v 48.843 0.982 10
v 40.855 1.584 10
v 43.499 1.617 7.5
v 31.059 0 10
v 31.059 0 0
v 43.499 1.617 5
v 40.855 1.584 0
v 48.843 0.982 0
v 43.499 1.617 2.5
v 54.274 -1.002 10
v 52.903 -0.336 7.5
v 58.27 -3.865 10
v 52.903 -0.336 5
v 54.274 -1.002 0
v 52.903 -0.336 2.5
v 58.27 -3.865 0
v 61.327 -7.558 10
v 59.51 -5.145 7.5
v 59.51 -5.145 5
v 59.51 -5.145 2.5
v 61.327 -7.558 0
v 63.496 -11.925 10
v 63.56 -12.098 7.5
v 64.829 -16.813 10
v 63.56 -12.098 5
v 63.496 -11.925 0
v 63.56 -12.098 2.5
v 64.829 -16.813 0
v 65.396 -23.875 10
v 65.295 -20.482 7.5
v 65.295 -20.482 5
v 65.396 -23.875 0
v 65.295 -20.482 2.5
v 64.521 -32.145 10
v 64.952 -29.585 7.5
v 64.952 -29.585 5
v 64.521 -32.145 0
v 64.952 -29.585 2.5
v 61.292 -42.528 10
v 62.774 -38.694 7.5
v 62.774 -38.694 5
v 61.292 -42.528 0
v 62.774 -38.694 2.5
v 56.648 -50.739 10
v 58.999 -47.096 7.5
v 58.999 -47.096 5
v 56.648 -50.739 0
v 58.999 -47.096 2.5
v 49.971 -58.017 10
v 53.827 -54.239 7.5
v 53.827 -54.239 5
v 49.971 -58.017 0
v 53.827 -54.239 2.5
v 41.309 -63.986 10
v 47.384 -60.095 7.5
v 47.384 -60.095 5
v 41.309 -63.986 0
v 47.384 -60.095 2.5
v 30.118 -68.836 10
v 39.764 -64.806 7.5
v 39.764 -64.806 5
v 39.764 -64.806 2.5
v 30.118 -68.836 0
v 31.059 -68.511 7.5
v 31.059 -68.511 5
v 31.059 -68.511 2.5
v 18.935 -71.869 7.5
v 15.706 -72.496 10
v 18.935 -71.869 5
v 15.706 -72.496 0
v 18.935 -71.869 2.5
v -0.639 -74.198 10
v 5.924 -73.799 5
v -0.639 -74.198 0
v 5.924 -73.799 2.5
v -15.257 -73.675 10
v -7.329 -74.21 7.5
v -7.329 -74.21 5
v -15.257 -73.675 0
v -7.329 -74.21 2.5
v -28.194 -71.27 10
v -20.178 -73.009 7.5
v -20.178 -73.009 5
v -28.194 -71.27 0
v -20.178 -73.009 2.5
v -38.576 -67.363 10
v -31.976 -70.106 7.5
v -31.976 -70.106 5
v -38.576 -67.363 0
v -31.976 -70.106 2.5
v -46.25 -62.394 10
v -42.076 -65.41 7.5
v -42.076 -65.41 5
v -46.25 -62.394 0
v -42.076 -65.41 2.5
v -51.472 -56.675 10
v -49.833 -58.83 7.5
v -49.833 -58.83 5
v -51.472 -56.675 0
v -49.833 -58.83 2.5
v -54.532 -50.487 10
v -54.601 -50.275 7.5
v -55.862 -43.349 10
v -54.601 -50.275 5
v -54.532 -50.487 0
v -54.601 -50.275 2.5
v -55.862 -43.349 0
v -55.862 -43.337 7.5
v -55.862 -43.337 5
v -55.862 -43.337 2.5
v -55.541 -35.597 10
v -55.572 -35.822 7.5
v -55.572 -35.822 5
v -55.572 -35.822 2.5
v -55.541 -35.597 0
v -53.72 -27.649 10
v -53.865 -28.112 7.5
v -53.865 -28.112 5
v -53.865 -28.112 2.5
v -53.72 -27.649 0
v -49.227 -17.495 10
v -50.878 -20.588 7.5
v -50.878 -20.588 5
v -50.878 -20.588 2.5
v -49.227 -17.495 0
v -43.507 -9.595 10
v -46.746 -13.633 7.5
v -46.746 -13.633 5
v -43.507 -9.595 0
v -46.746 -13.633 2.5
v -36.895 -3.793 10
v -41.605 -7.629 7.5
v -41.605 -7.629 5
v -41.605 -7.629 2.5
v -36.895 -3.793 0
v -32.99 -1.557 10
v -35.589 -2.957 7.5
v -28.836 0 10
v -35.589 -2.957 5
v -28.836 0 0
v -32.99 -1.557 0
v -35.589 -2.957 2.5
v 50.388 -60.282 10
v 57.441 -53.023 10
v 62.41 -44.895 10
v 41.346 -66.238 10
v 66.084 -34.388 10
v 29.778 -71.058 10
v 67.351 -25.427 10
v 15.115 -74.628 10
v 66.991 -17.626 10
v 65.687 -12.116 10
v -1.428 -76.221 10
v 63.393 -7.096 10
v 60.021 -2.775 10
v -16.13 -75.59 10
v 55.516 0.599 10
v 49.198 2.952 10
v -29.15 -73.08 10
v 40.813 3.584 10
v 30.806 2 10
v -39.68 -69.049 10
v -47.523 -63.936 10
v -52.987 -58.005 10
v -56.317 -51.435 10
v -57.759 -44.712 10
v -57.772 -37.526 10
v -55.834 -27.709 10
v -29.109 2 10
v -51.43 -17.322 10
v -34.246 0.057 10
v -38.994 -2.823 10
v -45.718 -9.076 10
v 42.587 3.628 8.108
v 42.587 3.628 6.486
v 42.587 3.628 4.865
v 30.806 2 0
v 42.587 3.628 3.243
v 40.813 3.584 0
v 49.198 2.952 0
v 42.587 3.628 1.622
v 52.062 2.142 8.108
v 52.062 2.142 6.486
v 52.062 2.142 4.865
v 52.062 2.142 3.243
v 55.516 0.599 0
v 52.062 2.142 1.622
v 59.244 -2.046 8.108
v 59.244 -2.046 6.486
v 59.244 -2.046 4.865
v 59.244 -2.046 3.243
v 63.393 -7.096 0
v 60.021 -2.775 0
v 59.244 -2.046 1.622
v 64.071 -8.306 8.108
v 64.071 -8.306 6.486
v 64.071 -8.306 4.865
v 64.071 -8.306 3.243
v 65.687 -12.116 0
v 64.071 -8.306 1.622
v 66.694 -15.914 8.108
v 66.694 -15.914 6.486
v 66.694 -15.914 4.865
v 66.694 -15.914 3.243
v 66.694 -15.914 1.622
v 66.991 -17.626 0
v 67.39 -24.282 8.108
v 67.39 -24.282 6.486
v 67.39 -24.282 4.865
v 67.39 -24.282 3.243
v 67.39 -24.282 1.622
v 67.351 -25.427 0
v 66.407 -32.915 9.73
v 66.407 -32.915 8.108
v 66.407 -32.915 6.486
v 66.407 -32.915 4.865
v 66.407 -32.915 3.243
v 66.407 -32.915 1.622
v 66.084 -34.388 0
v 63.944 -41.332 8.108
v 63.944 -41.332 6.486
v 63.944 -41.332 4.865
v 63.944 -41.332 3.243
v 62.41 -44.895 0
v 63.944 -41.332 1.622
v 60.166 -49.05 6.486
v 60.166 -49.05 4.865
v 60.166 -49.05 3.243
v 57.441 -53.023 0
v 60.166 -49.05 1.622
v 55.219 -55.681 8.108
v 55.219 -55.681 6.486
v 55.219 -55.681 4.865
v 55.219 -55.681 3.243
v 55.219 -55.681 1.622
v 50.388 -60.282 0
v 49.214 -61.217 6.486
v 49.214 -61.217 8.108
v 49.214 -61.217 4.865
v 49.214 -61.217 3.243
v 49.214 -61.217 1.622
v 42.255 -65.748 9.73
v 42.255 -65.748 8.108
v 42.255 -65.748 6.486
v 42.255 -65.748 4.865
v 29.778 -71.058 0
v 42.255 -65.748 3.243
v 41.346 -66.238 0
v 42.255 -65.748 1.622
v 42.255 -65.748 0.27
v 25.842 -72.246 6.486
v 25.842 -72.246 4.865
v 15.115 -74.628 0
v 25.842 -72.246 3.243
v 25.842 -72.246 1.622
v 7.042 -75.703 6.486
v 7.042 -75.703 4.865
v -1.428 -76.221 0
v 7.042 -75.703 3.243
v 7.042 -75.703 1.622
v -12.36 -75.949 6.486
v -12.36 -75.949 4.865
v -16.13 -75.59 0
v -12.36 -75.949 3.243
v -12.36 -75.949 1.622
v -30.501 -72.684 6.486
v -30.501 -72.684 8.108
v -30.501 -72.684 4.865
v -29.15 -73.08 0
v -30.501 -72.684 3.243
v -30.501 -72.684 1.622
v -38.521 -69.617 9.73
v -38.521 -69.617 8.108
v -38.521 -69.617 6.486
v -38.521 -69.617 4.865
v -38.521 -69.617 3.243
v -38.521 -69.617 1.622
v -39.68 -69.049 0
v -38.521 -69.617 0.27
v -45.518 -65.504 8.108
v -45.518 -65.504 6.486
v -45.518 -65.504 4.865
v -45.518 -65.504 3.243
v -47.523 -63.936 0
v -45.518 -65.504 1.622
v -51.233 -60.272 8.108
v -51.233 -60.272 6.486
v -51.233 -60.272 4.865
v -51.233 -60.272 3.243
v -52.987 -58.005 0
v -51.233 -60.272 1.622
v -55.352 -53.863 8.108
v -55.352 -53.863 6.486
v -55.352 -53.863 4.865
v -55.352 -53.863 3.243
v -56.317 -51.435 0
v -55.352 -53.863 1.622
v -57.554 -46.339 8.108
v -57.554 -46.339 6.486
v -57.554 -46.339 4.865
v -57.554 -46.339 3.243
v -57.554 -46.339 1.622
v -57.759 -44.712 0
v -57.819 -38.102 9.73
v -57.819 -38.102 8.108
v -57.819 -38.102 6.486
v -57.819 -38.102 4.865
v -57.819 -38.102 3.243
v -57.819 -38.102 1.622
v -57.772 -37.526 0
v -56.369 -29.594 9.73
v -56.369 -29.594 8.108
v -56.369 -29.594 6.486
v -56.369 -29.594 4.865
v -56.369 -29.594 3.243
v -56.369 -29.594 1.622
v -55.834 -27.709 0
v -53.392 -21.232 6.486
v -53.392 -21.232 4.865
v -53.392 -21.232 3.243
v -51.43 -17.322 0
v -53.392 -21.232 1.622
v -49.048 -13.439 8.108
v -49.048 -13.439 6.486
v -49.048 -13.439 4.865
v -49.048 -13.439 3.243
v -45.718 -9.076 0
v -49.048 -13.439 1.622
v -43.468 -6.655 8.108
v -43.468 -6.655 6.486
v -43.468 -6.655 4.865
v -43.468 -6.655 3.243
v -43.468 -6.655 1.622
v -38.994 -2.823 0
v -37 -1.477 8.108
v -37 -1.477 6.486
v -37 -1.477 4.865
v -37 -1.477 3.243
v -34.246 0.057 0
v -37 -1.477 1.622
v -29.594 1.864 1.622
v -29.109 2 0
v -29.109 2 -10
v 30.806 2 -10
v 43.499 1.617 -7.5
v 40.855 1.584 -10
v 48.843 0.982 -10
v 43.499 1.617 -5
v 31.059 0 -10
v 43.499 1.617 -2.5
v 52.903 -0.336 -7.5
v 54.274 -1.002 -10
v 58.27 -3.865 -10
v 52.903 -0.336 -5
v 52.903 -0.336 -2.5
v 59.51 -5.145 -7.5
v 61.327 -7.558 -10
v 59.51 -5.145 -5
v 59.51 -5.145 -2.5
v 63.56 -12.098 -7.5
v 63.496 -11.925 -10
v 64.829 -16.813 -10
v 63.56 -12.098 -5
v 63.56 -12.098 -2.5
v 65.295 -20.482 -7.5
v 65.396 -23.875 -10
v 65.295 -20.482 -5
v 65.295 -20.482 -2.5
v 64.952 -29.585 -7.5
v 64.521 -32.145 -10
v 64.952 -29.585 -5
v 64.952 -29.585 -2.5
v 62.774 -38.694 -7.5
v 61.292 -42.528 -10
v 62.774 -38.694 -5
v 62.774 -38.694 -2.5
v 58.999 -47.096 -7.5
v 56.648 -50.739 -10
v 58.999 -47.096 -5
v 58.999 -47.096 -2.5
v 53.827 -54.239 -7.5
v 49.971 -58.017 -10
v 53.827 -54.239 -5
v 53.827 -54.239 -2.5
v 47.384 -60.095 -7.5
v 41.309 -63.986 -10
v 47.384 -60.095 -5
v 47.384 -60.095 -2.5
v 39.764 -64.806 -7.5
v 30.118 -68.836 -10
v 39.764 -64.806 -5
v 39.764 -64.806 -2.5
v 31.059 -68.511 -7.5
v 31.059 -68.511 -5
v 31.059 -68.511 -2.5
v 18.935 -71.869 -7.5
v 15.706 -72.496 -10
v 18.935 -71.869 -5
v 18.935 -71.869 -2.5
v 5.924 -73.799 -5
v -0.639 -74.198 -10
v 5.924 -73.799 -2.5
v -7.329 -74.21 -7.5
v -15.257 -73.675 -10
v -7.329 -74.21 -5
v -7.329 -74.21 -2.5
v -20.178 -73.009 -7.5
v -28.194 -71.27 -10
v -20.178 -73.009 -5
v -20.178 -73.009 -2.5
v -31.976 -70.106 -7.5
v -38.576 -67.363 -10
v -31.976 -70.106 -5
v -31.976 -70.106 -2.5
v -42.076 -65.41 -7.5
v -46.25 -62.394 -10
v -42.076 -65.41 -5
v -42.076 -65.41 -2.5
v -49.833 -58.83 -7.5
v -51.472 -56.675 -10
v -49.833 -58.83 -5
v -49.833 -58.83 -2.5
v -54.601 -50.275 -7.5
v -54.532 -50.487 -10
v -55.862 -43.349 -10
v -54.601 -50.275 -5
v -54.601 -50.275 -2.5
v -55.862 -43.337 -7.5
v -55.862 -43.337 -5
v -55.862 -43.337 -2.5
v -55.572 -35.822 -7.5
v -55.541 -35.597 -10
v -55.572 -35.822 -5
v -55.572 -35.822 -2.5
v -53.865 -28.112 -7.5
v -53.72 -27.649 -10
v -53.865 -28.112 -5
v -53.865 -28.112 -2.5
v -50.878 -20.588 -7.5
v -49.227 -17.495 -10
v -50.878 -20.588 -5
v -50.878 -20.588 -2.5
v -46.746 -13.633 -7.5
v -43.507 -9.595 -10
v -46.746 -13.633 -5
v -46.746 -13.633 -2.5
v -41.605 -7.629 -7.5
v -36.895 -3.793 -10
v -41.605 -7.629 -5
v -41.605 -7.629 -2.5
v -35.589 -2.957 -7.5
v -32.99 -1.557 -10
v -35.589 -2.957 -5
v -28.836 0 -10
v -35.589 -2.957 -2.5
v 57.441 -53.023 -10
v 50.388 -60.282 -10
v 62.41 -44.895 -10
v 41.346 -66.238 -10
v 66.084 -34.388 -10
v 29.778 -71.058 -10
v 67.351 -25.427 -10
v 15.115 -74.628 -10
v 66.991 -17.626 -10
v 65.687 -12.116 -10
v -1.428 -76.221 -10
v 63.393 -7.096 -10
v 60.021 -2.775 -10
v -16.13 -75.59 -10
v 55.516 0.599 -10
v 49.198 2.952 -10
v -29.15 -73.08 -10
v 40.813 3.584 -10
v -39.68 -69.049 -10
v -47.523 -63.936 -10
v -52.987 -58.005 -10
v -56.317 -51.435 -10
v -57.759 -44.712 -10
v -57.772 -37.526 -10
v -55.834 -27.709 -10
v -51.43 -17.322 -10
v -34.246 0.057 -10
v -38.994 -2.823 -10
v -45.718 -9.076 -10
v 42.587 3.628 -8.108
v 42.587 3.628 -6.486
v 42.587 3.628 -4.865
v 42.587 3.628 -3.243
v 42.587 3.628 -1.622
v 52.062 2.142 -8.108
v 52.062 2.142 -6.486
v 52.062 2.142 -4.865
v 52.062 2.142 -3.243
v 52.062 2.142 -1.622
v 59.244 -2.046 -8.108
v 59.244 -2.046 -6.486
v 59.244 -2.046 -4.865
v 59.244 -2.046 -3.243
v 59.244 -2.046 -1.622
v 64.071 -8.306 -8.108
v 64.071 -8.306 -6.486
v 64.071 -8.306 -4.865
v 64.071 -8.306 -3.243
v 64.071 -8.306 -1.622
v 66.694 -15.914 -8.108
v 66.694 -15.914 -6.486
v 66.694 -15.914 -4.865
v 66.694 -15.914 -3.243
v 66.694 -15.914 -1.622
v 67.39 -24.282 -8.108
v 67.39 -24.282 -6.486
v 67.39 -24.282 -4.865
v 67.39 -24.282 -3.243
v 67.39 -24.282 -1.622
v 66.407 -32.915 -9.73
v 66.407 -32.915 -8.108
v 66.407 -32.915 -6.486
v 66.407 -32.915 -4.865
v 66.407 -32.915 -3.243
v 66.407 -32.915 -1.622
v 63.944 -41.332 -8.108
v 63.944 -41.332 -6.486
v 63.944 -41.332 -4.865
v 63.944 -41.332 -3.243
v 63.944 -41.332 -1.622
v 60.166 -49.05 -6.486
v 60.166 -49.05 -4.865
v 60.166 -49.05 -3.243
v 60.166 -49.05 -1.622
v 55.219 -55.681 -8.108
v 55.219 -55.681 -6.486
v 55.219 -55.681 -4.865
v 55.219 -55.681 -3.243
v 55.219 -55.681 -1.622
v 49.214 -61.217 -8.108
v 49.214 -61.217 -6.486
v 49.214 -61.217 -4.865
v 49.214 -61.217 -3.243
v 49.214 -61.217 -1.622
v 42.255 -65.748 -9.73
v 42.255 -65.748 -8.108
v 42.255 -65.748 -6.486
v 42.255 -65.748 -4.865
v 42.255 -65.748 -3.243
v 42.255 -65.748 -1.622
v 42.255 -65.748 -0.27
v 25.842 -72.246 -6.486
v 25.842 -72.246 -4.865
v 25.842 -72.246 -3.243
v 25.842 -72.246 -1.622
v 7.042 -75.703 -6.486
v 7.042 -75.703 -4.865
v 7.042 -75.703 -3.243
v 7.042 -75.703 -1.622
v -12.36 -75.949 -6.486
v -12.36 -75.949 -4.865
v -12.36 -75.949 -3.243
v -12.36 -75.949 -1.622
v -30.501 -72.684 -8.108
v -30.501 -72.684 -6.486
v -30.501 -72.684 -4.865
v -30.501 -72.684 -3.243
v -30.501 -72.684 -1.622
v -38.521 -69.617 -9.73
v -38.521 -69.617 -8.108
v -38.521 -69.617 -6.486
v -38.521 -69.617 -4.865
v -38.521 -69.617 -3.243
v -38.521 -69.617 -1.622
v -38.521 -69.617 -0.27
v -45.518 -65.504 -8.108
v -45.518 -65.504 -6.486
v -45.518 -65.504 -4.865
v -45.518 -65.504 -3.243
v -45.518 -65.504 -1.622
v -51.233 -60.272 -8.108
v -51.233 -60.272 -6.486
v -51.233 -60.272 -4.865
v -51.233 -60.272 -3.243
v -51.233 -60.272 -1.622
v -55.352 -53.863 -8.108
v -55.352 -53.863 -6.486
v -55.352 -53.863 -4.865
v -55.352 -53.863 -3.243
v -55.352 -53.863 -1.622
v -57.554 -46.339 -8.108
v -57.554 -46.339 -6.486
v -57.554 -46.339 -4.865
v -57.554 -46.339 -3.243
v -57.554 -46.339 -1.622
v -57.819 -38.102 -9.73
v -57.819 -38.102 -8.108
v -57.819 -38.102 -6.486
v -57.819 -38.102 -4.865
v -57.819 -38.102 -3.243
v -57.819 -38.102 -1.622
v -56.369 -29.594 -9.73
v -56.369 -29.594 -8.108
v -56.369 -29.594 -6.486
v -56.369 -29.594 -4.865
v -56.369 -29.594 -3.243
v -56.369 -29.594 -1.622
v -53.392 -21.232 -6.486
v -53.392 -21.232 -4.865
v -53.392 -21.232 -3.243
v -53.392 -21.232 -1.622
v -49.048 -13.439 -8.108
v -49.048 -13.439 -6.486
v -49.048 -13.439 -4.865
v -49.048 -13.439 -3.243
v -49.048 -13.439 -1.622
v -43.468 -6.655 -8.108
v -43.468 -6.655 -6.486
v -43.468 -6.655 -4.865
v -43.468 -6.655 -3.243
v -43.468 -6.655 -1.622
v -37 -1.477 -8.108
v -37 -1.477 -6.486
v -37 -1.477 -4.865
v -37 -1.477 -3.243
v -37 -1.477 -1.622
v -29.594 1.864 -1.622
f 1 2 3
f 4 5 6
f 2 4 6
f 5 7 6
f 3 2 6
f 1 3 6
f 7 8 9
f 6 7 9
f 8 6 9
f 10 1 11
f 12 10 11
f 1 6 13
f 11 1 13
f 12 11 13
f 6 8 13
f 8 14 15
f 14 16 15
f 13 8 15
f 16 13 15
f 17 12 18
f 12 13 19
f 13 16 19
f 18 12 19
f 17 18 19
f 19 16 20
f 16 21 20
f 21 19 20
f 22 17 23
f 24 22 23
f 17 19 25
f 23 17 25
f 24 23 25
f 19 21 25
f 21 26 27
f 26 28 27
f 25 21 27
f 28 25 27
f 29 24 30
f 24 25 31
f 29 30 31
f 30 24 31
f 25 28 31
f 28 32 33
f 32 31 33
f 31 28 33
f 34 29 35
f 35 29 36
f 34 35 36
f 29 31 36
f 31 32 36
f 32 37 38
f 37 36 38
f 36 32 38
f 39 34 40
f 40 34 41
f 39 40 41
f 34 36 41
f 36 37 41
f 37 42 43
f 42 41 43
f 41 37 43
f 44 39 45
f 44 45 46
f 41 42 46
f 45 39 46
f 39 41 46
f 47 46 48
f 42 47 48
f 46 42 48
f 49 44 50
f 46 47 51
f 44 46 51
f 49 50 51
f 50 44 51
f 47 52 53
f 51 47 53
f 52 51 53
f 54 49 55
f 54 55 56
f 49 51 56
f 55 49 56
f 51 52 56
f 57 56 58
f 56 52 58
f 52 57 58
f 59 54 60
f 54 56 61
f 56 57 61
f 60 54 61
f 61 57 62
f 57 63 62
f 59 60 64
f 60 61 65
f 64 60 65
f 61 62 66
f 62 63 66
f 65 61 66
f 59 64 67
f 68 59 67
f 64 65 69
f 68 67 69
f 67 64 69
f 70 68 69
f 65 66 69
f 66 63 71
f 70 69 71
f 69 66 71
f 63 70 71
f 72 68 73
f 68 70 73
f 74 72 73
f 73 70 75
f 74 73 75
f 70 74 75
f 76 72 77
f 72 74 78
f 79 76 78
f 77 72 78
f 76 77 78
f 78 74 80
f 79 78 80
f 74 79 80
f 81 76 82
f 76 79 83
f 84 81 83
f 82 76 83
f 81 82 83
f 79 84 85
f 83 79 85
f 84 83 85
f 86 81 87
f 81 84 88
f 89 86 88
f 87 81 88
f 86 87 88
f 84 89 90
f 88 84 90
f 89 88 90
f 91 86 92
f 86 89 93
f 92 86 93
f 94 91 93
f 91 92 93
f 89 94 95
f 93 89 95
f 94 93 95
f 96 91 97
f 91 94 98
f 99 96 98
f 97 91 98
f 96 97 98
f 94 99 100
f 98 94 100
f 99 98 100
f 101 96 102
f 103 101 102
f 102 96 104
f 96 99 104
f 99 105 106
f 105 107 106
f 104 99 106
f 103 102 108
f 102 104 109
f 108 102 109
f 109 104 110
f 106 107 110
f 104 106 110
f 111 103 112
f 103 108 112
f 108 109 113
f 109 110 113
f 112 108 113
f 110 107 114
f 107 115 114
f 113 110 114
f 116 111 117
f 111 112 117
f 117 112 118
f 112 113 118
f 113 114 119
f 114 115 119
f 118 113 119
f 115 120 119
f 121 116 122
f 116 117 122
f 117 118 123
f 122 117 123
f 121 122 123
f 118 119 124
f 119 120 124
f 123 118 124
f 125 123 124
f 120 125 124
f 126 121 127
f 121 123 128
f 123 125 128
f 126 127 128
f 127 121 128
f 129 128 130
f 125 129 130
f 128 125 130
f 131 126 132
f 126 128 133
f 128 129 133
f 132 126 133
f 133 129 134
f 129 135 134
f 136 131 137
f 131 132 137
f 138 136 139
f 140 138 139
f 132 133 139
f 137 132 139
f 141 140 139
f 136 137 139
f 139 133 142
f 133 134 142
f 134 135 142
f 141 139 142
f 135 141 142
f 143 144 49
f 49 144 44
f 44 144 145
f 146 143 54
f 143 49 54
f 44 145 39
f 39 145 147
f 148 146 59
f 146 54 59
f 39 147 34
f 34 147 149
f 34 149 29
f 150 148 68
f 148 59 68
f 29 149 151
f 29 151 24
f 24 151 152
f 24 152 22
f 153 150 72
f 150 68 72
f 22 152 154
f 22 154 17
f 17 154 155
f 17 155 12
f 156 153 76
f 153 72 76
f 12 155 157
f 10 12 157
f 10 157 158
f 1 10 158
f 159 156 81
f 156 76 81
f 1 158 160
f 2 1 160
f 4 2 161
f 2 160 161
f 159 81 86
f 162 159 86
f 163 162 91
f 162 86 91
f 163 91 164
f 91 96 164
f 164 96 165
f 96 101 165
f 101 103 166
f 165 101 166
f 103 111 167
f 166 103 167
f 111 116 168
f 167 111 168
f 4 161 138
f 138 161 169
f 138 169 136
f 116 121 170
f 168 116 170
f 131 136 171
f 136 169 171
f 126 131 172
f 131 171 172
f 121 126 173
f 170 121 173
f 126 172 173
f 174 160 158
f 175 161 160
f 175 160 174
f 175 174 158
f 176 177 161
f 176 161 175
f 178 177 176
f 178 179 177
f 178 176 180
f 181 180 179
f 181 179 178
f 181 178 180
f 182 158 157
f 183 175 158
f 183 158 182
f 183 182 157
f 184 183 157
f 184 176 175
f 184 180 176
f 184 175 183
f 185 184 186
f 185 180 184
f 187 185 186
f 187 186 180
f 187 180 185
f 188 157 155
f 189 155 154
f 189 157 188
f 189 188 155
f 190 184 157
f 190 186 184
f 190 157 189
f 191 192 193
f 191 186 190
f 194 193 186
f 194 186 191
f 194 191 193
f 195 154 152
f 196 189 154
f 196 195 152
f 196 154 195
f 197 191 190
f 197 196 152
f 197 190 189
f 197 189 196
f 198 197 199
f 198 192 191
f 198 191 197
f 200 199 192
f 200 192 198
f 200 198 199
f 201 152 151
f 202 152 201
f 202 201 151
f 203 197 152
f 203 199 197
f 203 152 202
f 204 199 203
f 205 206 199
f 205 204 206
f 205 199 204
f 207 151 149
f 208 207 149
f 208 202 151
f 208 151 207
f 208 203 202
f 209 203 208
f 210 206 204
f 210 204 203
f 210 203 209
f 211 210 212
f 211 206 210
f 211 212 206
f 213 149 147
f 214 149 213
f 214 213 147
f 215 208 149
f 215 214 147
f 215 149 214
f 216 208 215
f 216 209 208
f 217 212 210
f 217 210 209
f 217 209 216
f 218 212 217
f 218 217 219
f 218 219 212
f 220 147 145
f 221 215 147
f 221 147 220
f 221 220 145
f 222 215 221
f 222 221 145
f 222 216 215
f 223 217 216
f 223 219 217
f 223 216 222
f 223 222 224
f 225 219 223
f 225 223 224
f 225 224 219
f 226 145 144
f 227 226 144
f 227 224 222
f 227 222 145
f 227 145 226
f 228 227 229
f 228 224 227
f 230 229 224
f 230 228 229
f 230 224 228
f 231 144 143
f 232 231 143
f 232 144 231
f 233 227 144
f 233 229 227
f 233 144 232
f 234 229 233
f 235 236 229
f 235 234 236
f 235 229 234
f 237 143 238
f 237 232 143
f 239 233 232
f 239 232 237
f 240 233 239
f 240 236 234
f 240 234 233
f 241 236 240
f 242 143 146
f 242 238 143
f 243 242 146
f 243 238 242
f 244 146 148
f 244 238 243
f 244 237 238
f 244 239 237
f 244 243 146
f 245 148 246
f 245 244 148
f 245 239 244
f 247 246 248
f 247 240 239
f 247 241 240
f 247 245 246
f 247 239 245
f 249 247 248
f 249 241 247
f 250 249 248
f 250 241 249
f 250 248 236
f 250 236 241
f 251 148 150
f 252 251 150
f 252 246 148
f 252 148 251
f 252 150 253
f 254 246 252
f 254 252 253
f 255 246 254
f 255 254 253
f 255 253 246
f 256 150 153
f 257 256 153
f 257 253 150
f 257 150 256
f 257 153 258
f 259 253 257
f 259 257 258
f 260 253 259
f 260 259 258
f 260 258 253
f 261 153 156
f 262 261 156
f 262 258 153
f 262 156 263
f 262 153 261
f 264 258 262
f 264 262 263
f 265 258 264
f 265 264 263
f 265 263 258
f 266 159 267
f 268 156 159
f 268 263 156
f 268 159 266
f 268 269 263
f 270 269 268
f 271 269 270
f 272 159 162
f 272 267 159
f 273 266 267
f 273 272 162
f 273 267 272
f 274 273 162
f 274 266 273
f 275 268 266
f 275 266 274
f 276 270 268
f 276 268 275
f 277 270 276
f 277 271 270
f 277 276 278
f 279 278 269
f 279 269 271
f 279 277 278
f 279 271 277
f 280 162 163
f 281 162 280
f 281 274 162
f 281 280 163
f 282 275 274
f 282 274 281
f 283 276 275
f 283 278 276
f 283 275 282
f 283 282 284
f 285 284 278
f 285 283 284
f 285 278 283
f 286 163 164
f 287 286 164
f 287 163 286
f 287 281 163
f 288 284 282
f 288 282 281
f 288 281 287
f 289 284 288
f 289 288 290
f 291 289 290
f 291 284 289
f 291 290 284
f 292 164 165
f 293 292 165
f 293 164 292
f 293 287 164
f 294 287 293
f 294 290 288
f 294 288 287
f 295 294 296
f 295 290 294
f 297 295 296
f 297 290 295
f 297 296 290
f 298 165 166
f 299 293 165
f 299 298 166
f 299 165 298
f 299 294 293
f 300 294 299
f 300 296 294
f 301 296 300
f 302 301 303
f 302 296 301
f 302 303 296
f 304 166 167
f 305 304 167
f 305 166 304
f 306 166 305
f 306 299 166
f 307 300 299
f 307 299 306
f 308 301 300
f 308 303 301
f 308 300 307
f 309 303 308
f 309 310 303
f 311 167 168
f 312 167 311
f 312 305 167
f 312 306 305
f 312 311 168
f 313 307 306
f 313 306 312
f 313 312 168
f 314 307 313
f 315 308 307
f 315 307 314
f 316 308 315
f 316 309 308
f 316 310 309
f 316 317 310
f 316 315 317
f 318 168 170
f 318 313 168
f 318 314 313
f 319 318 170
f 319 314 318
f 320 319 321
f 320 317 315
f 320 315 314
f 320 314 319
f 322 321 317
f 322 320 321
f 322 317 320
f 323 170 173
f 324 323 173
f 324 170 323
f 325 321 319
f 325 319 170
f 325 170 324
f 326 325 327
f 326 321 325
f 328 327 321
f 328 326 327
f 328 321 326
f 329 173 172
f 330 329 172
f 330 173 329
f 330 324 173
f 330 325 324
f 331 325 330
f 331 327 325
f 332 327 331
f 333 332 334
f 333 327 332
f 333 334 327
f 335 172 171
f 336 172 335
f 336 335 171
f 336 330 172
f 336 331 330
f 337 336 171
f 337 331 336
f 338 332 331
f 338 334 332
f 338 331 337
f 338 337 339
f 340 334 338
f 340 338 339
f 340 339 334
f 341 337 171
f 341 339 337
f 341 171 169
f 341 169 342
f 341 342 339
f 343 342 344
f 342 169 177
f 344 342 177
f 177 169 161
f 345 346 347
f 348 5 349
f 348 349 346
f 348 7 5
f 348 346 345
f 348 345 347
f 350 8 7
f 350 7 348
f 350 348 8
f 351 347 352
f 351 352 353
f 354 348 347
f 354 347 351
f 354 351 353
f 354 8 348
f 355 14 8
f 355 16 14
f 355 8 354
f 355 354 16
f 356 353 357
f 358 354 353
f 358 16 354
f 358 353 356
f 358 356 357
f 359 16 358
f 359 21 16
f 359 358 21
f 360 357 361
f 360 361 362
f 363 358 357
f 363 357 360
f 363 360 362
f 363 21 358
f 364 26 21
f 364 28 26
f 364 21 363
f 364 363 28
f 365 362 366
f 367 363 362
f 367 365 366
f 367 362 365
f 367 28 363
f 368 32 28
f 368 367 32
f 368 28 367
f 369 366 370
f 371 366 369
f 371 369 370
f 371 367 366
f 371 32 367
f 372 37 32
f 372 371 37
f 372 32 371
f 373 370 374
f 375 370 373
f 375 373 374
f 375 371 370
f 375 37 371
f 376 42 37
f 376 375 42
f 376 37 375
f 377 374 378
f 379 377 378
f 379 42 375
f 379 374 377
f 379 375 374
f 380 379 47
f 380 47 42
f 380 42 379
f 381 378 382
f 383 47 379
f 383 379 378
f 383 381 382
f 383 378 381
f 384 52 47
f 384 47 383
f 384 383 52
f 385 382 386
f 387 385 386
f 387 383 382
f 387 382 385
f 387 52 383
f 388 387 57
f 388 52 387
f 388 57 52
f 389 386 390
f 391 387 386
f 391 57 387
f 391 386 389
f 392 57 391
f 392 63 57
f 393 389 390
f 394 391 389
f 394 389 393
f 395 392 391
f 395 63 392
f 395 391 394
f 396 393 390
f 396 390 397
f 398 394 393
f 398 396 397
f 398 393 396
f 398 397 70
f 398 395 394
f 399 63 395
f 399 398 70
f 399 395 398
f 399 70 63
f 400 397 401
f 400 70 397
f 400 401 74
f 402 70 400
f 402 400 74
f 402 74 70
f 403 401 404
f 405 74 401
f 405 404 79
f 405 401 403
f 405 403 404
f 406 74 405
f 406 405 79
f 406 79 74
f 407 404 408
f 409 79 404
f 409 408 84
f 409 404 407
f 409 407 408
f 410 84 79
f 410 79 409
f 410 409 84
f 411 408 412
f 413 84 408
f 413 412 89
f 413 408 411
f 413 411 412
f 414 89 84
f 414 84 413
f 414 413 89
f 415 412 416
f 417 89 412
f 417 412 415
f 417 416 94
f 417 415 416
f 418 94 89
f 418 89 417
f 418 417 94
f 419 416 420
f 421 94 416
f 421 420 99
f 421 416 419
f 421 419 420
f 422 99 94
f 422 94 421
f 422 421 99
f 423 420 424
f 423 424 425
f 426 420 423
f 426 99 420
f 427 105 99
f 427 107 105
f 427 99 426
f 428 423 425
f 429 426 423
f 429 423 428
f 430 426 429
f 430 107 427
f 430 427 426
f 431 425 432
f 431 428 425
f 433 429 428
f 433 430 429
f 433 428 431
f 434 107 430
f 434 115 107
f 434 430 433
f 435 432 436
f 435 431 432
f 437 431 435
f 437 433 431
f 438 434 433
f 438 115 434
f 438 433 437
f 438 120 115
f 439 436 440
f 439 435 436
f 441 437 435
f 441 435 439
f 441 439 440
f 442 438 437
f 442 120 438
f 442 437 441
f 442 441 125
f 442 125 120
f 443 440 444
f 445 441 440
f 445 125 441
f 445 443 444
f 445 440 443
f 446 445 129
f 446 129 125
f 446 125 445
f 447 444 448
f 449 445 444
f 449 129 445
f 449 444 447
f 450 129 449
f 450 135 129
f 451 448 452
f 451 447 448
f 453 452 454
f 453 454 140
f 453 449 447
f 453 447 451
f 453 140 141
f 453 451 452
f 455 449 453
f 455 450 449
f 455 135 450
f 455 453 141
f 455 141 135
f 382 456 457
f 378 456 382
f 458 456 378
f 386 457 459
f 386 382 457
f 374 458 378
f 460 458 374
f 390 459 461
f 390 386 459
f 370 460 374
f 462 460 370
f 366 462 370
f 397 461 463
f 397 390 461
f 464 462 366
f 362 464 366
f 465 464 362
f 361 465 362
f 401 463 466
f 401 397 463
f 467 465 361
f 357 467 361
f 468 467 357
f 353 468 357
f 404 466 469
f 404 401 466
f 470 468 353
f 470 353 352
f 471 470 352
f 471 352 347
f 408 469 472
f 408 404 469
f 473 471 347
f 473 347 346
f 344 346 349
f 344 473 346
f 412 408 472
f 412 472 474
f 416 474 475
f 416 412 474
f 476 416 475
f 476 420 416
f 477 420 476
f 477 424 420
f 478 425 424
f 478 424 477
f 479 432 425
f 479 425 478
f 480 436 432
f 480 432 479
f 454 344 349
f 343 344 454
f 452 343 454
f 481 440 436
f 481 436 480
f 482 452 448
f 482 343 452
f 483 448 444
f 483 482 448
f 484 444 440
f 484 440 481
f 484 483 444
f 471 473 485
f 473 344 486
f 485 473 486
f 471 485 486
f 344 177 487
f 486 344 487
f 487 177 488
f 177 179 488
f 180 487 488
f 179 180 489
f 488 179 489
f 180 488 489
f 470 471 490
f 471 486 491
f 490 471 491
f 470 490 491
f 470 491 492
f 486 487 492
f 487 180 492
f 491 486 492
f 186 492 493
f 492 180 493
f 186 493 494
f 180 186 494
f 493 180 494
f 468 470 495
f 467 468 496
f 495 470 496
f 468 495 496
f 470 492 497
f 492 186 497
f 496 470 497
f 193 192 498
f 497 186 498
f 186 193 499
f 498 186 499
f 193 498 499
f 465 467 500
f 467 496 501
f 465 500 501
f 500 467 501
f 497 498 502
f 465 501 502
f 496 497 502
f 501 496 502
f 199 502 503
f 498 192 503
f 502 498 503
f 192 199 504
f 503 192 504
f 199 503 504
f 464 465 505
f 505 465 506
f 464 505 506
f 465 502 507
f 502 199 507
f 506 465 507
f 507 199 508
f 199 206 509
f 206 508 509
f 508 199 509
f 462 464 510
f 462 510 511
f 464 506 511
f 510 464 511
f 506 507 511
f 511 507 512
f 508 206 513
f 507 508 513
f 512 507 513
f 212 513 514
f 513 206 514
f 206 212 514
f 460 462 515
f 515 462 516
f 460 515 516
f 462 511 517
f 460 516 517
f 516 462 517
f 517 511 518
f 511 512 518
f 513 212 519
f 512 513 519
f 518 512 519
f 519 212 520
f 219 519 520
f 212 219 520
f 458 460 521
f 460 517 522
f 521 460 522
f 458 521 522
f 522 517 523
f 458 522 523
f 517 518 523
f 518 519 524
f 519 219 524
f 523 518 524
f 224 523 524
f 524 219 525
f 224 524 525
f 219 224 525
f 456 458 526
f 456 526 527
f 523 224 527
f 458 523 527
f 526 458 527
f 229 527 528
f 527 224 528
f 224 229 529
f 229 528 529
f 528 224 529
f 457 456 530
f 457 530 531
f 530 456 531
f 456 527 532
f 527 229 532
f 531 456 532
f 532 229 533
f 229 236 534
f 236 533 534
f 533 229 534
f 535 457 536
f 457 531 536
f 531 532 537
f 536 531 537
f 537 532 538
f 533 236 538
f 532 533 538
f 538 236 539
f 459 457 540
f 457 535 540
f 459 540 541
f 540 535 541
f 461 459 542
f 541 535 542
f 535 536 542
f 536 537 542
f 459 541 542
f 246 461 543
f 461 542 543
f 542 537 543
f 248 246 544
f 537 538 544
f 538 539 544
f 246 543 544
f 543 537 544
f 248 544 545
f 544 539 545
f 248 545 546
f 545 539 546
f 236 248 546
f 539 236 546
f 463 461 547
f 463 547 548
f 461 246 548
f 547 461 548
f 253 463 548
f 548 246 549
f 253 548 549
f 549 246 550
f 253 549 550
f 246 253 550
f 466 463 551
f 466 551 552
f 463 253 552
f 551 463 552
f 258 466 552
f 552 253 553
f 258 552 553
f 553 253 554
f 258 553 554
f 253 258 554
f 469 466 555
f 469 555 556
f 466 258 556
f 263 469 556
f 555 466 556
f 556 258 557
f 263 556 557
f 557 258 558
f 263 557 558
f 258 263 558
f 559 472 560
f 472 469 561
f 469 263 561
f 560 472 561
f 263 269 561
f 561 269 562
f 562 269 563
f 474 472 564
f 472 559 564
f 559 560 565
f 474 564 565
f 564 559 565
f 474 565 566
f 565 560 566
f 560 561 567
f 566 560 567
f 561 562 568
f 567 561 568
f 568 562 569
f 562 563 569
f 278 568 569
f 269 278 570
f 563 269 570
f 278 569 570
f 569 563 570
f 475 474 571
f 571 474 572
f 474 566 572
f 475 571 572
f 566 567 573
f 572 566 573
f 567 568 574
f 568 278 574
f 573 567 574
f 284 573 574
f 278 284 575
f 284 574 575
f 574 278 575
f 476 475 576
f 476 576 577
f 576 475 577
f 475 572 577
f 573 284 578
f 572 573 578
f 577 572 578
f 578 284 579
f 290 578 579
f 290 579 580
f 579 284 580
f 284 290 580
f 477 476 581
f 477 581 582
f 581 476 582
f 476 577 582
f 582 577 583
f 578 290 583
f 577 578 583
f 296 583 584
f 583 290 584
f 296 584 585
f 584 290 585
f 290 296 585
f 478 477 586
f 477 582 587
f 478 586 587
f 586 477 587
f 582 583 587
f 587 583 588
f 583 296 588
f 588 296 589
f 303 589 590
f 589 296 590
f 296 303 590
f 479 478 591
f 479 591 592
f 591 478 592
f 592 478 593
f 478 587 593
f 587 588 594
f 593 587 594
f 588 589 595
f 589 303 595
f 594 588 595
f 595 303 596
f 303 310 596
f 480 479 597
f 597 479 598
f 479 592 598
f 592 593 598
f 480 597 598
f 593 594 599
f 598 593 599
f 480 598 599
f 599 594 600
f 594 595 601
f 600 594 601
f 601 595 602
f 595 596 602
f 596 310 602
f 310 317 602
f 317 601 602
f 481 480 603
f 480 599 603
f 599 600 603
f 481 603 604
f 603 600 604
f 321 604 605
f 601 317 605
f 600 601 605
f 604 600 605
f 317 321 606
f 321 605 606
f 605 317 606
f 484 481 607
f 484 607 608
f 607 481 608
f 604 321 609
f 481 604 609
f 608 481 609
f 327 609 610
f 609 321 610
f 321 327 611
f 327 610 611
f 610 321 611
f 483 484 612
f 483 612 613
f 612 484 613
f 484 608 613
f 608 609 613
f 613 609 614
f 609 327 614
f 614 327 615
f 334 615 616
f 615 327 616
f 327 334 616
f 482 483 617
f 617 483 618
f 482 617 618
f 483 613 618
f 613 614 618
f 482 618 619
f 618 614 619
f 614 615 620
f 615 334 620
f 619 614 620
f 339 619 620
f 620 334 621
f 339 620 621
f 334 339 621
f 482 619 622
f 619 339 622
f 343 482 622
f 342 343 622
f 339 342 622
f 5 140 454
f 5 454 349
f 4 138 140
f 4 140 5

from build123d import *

# Parameters (mm, degrees)
BOSS_EXTRUDE1_DEPTH = 10


with BuildPart() as part:
    # Sketch1 → Boss-Extrude1 (new body, symmetric)
    with BuildSketch(Plane.XY):
        with BuildLine():
            Line((-29.109488938, 2), (30.806019374, 2))
            add(Edge.make_bspline(
                [(30.806019374, 2), (31.339005391, 2.13589874), (32.420285659, 2.39664087), (34.502023546, 2.838658031), (37.019447608, 3.261004871), (39.887533308, 3.560639976), (43.519128896, 3.693738515), (47.700836797, 3.373944758), (52.157359772, 2.256288216), (56.044035485, 0.455274826), (60.444334505, -2.763904799), (64.442297521, -8.086729155), (67.012750653, -15.78971807), (67.668343918, -24.238230618), (66.652434223, -32.950277254), (64.162524345, -41.448894606), (60.360062445, -49.246462696), (55.395640775, -55.864053474), (49.372938514, -61.385143133), (42.397299201, -65.897910229), (34.569189201, -69.513718914), (23.072251511, -73.320523974), (7.140831425, -76.238142585), (-12.571253539, -76.531233106), (-31.017229704, -73.329970509), (-43.807972088, -67.432043748), (-51.496493039, -60.468967394), (-55.683262495, -54.063466146), (-57.884892933, -46.455382485), (-58.10101488, -38.14720342), (-56.623689052, -29.57026659), (-52.617447299, -18.327017856), (-45.890452943, -8.213436103), (-38.059201908, -1.909827174), (-33.708577362, 0.38036745), (-31.426231137, 1.281380833), (-30.26953148, 1.663956301), (-29.588436418, 1.867390986), (-29.271166606, 1.954932691), (-29.109488938, 2)],
                knots=[0.000597945, 0.000597945, 0.000597945, 0.000597945, 0.004506152, 0.008414359, 0.016230774, 0.024047188, 0.031863602, 0.047496431, 0.06312926, 0.078762089, 0.094394918, 0.125660575, 0.156926233, 0.188191891, 0.219457548, 0.250723206, 0.281988864, 0.313254521, 0.344520179, 0.375785837, 0.407051494, 0.438317152, 0.500848467, 0.563379783, 0.625911098, 0.688442413, 0.719708071, 0.750973729, 0.782239386, 0.813505044, 0.844770702, 0.876036359, 0.938567675, 0.969833332, 0.985466161, 0.993282576, 0.997190783, 0.999144886, 1.00109899, 1.00109899, 1.00109899, 1.00109899], degree=3))
        make_face()
        with BuildLine():
            Line((-28.835955081, 0), (31.058979205, 0))
            add(Edge.make_bspline(
                [(31.058979205, 0), (68.495483915, 9.703365158), (72.225474707, -44.302023431), (19.353809106, -80.691988602), (-78.423863055, -73.429422761), (-47.708464205, -5.260672109), (-28.835955081, 0)],
                knots=[0, 0, 0, 0, 0.277880774, 0.417213322, 0.76385294, 1, 1, 1, 1], degree=3))
        make_face(mode=Mode.SUBTRACT)
    extrude(amount=BOSS_EXTRUDE1_DEPTH, both=True)


solid = part.part
